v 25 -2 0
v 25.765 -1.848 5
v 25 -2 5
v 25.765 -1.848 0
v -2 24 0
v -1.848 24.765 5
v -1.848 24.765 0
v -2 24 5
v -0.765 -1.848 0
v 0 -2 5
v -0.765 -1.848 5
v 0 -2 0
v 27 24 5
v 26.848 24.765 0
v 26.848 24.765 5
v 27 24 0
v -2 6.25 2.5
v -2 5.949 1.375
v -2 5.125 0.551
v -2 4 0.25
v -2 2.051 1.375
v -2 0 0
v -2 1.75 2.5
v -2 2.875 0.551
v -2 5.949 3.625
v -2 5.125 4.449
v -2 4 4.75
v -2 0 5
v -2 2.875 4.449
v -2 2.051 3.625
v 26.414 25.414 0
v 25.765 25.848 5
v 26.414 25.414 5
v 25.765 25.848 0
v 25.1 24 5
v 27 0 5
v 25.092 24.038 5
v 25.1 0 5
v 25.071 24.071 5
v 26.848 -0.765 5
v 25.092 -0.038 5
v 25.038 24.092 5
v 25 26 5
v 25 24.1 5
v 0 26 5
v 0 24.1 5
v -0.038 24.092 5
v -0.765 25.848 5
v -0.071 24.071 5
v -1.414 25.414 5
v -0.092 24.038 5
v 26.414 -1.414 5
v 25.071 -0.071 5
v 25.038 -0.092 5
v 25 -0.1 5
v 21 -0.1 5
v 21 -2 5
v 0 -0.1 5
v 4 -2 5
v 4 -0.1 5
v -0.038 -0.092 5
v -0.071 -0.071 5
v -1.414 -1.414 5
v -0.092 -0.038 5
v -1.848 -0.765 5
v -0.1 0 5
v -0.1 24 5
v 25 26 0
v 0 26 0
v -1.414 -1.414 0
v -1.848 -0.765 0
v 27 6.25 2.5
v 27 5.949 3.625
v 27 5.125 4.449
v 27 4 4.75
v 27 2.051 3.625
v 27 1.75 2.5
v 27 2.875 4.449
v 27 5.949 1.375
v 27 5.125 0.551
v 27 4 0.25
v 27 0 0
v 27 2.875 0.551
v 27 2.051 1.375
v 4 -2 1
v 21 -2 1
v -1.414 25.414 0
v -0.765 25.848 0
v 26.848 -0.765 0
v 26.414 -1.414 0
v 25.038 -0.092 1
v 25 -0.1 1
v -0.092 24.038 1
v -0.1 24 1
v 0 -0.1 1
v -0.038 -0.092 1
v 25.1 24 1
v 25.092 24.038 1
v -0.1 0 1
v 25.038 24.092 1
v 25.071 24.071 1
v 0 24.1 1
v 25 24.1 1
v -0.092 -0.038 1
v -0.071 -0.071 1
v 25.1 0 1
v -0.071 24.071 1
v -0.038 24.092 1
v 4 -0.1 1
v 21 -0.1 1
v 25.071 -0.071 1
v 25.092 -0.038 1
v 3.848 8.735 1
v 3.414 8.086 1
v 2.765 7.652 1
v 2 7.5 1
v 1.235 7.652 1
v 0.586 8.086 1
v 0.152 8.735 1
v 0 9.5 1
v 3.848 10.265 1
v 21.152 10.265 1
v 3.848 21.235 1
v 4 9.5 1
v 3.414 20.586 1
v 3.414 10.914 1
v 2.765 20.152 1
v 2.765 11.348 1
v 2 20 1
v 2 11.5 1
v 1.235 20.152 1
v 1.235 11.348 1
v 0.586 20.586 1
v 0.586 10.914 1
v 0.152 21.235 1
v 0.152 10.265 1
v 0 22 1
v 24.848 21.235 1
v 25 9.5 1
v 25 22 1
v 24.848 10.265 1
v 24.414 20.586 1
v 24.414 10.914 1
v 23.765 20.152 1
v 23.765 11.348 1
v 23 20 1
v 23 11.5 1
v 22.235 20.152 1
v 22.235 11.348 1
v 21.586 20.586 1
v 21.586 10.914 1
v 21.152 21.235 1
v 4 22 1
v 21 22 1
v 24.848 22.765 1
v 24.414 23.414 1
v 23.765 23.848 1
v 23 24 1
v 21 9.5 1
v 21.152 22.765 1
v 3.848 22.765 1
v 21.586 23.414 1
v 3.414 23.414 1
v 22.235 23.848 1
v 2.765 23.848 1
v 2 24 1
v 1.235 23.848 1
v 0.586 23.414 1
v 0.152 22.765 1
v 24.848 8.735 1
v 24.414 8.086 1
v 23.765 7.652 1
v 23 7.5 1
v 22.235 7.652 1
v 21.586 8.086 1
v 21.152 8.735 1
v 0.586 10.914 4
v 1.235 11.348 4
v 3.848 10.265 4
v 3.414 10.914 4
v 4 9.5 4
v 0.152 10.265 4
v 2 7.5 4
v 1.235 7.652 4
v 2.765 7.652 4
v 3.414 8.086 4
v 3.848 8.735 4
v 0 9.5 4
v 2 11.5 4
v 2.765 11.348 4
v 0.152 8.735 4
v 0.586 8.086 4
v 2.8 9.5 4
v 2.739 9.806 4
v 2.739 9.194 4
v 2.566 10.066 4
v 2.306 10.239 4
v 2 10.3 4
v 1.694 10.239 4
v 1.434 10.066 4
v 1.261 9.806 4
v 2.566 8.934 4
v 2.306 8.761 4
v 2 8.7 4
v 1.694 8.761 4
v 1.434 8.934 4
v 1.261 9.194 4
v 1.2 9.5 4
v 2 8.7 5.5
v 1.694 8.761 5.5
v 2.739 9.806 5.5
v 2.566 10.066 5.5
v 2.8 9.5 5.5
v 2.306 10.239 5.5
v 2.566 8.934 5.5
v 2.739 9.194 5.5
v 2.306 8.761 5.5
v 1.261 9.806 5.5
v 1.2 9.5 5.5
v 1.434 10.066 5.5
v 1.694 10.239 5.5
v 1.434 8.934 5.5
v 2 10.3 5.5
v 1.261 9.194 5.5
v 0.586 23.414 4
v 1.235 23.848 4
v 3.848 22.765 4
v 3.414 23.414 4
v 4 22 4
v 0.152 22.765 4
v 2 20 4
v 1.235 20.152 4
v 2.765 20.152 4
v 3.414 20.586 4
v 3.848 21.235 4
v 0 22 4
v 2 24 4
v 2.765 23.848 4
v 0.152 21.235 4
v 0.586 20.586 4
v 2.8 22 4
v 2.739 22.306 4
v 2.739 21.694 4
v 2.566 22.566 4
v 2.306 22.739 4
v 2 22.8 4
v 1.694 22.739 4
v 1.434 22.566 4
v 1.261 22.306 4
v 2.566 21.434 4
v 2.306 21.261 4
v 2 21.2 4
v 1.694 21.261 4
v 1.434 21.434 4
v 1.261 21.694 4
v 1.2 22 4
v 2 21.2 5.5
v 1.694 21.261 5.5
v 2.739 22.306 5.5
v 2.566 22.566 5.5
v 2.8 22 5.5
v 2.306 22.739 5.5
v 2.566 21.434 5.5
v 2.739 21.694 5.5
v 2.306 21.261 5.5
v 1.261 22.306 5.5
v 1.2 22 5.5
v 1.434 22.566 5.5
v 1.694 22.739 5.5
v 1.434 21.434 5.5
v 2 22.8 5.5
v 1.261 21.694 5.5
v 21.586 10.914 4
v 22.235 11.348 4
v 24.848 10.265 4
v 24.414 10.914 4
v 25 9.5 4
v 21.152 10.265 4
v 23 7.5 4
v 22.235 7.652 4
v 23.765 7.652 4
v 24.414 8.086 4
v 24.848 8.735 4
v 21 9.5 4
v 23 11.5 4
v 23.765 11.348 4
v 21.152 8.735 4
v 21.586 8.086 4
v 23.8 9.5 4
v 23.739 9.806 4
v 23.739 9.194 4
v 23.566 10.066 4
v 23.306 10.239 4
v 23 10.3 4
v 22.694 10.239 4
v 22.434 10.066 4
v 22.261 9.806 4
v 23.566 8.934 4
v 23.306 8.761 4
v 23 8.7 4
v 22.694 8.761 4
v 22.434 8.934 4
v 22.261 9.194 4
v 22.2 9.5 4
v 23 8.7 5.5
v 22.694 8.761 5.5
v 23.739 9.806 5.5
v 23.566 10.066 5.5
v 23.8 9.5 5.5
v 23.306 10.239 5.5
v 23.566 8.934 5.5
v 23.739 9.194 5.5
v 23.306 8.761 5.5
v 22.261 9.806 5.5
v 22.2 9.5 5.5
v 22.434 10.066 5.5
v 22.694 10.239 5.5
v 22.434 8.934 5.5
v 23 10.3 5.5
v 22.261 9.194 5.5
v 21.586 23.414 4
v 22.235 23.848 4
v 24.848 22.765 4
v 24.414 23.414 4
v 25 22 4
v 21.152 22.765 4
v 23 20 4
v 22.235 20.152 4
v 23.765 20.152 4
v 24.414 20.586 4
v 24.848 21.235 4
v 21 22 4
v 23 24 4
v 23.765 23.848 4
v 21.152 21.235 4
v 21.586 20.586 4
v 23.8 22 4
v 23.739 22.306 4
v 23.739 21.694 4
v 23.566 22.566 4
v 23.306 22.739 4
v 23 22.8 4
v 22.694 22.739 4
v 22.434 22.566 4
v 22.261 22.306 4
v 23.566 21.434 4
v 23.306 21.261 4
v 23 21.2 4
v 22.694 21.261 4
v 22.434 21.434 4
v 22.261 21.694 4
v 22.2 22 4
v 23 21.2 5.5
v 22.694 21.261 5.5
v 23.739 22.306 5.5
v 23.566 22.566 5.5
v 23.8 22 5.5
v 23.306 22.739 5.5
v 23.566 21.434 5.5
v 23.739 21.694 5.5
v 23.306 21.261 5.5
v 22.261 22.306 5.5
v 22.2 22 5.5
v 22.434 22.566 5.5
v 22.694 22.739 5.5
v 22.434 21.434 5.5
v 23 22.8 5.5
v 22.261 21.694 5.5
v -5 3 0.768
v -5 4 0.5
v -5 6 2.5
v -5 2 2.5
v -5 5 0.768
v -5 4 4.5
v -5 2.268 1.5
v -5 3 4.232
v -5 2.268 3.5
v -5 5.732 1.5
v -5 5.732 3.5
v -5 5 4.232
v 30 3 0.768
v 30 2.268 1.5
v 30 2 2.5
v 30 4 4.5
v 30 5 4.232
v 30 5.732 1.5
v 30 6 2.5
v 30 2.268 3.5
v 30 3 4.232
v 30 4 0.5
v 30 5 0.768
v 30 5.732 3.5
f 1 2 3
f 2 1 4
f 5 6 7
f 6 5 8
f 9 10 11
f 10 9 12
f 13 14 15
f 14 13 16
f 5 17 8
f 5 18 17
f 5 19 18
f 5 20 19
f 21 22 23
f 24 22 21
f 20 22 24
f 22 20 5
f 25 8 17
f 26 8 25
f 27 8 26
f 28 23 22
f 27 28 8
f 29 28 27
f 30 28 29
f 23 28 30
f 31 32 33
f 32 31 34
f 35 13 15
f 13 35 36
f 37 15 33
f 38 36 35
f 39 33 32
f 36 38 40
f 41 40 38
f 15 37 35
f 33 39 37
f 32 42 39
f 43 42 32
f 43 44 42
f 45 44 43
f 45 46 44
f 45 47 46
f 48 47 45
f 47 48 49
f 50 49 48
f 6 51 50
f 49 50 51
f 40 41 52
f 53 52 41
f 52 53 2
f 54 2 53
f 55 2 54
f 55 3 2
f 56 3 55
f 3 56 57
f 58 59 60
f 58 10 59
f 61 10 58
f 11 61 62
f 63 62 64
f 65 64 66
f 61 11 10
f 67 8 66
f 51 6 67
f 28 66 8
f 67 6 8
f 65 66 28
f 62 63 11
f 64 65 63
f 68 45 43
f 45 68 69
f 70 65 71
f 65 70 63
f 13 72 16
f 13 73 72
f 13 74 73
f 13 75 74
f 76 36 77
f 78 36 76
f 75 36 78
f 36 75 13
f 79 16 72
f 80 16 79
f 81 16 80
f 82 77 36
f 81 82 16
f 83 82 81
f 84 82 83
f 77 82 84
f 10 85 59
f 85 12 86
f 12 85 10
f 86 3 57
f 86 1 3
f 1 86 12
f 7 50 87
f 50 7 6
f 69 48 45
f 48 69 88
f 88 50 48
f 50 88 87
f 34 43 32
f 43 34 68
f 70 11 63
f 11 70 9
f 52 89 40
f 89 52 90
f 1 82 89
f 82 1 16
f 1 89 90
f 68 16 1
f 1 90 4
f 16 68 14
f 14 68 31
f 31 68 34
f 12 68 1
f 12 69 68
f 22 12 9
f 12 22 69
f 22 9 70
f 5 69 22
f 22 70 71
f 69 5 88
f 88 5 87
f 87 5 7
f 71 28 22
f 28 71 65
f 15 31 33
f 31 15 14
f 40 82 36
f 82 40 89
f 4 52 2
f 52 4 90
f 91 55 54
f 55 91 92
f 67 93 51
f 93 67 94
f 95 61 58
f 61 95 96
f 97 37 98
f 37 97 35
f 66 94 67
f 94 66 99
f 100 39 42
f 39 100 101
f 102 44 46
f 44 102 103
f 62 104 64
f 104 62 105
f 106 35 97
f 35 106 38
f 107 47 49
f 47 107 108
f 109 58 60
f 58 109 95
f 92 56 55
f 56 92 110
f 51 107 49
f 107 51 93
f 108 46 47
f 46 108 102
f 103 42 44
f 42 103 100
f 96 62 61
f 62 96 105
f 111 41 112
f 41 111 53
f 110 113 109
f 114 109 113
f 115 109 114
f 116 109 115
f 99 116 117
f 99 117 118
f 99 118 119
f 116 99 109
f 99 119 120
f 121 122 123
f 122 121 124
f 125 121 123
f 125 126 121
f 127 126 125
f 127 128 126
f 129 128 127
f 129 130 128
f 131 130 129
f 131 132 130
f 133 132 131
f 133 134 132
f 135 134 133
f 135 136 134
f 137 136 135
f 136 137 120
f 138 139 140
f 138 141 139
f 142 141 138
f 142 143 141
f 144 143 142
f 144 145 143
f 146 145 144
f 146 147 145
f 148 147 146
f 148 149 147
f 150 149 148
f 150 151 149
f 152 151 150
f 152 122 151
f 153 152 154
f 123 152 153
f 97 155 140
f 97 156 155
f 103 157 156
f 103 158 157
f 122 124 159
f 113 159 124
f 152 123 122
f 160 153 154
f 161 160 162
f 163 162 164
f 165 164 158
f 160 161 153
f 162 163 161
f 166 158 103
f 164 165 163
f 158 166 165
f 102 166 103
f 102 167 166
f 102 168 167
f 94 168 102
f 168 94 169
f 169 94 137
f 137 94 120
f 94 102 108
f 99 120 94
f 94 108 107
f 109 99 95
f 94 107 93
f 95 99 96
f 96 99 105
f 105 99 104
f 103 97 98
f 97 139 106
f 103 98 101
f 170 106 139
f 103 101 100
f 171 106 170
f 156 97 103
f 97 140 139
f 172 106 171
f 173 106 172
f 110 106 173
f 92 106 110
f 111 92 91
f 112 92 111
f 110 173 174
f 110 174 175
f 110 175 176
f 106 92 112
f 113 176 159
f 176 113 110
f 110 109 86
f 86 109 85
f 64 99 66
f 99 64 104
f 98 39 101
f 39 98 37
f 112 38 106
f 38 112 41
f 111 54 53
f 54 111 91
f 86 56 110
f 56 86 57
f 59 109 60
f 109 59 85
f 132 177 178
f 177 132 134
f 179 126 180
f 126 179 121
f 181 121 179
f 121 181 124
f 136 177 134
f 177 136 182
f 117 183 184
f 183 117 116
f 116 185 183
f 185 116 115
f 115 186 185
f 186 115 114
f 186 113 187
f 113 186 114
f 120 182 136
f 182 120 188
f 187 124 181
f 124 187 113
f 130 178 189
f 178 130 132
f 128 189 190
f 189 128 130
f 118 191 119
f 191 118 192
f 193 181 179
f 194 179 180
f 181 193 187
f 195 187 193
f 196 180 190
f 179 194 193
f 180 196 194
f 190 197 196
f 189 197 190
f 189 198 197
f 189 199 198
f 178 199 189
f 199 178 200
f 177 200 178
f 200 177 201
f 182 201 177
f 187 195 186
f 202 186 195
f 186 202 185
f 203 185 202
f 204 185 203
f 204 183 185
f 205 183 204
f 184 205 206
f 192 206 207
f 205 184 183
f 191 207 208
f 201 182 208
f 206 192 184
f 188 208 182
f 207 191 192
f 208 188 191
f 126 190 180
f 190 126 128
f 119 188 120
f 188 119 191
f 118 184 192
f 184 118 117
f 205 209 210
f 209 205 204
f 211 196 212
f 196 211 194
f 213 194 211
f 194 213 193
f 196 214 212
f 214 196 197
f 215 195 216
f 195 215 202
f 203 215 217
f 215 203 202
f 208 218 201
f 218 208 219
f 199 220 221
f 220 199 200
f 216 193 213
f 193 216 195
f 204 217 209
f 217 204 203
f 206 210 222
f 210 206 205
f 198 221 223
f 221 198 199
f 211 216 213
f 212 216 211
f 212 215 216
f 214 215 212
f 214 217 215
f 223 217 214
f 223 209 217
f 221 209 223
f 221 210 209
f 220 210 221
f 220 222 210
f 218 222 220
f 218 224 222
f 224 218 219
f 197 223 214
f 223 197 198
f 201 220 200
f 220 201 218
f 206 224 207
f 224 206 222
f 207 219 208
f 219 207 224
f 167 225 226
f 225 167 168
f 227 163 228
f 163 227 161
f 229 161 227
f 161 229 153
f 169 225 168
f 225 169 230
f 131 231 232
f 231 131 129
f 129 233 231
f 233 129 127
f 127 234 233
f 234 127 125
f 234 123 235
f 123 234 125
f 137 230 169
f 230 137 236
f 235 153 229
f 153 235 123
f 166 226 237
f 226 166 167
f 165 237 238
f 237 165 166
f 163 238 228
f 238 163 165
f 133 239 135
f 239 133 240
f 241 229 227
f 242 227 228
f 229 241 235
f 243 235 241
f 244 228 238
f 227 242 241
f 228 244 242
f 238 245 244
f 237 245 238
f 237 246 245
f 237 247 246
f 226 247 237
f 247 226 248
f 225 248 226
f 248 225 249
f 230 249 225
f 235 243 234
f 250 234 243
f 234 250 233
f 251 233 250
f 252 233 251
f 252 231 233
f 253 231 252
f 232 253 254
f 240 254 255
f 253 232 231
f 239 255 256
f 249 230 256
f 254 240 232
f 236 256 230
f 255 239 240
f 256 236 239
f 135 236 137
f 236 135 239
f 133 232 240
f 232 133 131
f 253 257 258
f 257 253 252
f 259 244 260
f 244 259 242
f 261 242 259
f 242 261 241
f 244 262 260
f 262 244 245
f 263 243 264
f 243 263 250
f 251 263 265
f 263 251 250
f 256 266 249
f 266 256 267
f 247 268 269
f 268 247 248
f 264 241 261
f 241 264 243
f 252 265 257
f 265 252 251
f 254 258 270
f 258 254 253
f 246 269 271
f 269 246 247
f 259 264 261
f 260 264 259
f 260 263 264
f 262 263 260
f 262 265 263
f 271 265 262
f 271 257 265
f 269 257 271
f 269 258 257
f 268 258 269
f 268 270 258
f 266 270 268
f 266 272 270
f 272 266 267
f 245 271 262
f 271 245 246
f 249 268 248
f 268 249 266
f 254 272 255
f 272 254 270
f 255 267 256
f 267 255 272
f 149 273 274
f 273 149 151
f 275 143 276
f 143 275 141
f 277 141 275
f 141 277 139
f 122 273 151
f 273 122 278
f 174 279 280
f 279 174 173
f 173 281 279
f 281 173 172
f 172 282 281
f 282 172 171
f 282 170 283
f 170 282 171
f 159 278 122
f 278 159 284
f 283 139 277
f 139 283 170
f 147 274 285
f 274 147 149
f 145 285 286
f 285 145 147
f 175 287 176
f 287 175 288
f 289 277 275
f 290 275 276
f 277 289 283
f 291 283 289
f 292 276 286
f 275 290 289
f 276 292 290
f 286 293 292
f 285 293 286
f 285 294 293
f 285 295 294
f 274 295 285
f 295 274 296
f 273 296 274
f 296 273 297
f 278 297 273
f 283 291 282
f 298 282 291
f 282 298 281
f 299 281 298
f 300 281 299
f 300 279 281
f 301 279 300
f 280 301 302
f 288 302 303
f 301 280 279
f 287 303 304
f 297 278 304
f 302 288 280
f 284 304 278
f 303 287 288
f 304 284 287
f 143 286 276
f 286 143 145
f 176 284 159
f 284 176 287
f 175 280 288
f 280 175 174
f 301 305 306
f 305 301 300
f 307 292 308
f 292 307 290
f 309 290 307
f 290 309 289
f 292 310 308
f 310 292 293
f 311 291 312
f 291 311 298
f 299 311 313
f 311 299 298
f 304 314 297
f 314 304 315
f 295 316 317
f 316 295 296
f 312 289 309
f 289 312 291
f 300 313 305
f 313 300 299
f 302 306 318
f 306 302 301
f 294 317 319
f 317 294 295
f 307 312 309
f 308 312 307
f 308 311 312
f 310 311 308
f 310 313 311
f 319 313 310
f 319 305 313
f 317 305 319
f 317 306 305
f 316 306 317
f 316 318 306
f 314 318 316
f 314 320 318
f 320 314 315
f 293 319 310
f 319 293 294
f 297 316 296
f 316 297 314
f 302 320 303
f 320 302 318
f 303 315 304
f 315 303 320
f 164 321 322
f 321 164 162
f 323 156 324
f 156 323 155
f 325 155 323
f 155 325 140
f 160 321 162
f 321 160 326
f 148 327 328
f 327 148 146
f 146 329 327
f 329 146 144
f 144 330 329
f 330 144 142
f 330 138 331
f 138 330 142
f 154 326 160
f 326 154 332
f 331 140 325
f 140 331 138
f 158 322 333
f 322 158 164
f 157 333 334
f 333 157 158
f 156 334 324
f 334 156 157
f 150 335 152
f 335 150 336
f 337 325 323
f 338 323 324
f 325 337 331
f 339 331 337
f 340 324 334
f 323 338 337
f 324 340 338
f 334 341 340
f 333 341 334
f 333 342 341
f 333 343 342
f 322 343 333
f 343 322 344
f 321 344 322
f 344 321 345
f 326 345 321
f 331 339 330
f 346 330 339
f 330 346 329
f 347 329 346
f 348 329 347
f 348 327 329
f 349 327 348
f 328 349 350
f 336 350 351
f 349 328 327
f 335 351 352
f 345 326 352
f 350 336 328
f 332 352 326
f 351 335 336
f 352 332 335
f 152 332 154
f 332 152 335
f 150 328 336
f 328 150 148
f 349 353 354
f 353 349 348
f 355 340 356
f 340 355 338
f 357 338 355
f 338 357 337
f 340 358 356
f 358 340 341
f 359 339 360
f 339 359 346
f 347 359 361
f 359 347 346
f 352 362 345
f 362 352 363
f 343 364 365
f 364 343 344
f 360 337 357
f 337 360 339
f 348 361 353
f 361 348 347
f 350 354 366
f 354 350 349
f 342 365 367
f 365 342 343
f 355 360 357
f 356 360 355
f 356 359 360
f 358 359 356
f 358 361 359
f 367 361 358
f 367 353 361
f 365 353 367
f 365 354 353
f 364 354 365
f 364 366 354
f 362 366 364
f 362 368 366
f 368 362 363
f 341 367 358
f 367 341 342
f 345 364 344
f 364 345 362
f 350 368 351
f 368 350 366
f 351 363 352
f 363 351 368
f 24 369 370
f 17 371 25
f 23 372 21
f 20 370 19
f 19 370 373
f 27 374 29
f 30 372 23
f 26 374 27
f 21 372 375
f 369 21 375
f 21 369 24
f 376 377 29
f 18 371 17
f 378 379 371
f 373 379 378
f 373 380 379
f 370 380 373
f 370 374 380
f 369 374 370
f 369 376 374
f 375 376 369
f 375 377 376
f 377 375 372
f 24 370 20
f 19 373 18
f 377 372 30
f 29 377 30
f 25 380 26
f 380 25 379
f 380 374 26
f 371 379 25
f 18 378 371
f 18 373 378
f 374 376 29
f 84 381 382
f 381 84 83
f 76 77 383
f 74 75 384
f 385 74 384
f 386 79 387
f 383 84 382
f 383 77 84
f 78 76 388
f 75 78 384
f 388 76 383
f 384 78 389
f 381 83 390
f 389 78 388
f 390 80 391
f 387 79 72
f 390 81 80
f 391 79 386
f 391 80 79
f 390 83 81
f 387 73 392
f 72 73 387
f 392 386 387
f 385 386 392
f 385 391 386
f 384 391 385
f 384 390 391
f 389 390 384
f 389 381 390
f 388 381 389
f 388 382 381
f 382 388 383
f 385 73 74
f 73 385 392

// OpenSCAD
// Mcam1.scad
// This is the back for the camera

// main shell
difference(){
    color("yellow")
    linear_extrude(height=5)
    offset(r=2,$fn=16)    
    square(size=[25,24]);

    translate([0,0,1])
    color("orange")
    linear_extrude(height=5)
    offset(r=0.1,$fn=16)    
    square(size=[25,24]);

    translate([4,-3,1])
    color("green")
    cube([17,5,5]);

}

// posts to support PCB
translate([2.0,9.5,1]){
    cylinder(r=2,h=3,$fn=16);
    cylinder(r=0.8,h=4.5,$fn=16);
}
translate([2.0,22,1]){
    cylinder(r=2,h=3,$fn=16);
    cylinder(r=0.8,h=4.5,$fn=16);
}
translate([23.0,9.5,1]){
    cylinder(r=2,h=3,$fn=16);
    cylinder(r=0.8,h=4.5,$fn=16);
}
translate([23.0,22,1]){
    cylinder(r=2,h=3,$fn=16);
    cylinder(r=0.8,h=4.5,$fn=16);
}

// pivots on sides to mount
translate([-5,4,2.5])
color("pink")
rotate([0,90,0])
cylinder(r1=2,r2=2.25,h=3,$fn=12);

translate([30,4,2.5])
color("pink")
rotate([0,-90,0])
cylinder(r1=2,r2=2.25,h=3,$fn=12);
